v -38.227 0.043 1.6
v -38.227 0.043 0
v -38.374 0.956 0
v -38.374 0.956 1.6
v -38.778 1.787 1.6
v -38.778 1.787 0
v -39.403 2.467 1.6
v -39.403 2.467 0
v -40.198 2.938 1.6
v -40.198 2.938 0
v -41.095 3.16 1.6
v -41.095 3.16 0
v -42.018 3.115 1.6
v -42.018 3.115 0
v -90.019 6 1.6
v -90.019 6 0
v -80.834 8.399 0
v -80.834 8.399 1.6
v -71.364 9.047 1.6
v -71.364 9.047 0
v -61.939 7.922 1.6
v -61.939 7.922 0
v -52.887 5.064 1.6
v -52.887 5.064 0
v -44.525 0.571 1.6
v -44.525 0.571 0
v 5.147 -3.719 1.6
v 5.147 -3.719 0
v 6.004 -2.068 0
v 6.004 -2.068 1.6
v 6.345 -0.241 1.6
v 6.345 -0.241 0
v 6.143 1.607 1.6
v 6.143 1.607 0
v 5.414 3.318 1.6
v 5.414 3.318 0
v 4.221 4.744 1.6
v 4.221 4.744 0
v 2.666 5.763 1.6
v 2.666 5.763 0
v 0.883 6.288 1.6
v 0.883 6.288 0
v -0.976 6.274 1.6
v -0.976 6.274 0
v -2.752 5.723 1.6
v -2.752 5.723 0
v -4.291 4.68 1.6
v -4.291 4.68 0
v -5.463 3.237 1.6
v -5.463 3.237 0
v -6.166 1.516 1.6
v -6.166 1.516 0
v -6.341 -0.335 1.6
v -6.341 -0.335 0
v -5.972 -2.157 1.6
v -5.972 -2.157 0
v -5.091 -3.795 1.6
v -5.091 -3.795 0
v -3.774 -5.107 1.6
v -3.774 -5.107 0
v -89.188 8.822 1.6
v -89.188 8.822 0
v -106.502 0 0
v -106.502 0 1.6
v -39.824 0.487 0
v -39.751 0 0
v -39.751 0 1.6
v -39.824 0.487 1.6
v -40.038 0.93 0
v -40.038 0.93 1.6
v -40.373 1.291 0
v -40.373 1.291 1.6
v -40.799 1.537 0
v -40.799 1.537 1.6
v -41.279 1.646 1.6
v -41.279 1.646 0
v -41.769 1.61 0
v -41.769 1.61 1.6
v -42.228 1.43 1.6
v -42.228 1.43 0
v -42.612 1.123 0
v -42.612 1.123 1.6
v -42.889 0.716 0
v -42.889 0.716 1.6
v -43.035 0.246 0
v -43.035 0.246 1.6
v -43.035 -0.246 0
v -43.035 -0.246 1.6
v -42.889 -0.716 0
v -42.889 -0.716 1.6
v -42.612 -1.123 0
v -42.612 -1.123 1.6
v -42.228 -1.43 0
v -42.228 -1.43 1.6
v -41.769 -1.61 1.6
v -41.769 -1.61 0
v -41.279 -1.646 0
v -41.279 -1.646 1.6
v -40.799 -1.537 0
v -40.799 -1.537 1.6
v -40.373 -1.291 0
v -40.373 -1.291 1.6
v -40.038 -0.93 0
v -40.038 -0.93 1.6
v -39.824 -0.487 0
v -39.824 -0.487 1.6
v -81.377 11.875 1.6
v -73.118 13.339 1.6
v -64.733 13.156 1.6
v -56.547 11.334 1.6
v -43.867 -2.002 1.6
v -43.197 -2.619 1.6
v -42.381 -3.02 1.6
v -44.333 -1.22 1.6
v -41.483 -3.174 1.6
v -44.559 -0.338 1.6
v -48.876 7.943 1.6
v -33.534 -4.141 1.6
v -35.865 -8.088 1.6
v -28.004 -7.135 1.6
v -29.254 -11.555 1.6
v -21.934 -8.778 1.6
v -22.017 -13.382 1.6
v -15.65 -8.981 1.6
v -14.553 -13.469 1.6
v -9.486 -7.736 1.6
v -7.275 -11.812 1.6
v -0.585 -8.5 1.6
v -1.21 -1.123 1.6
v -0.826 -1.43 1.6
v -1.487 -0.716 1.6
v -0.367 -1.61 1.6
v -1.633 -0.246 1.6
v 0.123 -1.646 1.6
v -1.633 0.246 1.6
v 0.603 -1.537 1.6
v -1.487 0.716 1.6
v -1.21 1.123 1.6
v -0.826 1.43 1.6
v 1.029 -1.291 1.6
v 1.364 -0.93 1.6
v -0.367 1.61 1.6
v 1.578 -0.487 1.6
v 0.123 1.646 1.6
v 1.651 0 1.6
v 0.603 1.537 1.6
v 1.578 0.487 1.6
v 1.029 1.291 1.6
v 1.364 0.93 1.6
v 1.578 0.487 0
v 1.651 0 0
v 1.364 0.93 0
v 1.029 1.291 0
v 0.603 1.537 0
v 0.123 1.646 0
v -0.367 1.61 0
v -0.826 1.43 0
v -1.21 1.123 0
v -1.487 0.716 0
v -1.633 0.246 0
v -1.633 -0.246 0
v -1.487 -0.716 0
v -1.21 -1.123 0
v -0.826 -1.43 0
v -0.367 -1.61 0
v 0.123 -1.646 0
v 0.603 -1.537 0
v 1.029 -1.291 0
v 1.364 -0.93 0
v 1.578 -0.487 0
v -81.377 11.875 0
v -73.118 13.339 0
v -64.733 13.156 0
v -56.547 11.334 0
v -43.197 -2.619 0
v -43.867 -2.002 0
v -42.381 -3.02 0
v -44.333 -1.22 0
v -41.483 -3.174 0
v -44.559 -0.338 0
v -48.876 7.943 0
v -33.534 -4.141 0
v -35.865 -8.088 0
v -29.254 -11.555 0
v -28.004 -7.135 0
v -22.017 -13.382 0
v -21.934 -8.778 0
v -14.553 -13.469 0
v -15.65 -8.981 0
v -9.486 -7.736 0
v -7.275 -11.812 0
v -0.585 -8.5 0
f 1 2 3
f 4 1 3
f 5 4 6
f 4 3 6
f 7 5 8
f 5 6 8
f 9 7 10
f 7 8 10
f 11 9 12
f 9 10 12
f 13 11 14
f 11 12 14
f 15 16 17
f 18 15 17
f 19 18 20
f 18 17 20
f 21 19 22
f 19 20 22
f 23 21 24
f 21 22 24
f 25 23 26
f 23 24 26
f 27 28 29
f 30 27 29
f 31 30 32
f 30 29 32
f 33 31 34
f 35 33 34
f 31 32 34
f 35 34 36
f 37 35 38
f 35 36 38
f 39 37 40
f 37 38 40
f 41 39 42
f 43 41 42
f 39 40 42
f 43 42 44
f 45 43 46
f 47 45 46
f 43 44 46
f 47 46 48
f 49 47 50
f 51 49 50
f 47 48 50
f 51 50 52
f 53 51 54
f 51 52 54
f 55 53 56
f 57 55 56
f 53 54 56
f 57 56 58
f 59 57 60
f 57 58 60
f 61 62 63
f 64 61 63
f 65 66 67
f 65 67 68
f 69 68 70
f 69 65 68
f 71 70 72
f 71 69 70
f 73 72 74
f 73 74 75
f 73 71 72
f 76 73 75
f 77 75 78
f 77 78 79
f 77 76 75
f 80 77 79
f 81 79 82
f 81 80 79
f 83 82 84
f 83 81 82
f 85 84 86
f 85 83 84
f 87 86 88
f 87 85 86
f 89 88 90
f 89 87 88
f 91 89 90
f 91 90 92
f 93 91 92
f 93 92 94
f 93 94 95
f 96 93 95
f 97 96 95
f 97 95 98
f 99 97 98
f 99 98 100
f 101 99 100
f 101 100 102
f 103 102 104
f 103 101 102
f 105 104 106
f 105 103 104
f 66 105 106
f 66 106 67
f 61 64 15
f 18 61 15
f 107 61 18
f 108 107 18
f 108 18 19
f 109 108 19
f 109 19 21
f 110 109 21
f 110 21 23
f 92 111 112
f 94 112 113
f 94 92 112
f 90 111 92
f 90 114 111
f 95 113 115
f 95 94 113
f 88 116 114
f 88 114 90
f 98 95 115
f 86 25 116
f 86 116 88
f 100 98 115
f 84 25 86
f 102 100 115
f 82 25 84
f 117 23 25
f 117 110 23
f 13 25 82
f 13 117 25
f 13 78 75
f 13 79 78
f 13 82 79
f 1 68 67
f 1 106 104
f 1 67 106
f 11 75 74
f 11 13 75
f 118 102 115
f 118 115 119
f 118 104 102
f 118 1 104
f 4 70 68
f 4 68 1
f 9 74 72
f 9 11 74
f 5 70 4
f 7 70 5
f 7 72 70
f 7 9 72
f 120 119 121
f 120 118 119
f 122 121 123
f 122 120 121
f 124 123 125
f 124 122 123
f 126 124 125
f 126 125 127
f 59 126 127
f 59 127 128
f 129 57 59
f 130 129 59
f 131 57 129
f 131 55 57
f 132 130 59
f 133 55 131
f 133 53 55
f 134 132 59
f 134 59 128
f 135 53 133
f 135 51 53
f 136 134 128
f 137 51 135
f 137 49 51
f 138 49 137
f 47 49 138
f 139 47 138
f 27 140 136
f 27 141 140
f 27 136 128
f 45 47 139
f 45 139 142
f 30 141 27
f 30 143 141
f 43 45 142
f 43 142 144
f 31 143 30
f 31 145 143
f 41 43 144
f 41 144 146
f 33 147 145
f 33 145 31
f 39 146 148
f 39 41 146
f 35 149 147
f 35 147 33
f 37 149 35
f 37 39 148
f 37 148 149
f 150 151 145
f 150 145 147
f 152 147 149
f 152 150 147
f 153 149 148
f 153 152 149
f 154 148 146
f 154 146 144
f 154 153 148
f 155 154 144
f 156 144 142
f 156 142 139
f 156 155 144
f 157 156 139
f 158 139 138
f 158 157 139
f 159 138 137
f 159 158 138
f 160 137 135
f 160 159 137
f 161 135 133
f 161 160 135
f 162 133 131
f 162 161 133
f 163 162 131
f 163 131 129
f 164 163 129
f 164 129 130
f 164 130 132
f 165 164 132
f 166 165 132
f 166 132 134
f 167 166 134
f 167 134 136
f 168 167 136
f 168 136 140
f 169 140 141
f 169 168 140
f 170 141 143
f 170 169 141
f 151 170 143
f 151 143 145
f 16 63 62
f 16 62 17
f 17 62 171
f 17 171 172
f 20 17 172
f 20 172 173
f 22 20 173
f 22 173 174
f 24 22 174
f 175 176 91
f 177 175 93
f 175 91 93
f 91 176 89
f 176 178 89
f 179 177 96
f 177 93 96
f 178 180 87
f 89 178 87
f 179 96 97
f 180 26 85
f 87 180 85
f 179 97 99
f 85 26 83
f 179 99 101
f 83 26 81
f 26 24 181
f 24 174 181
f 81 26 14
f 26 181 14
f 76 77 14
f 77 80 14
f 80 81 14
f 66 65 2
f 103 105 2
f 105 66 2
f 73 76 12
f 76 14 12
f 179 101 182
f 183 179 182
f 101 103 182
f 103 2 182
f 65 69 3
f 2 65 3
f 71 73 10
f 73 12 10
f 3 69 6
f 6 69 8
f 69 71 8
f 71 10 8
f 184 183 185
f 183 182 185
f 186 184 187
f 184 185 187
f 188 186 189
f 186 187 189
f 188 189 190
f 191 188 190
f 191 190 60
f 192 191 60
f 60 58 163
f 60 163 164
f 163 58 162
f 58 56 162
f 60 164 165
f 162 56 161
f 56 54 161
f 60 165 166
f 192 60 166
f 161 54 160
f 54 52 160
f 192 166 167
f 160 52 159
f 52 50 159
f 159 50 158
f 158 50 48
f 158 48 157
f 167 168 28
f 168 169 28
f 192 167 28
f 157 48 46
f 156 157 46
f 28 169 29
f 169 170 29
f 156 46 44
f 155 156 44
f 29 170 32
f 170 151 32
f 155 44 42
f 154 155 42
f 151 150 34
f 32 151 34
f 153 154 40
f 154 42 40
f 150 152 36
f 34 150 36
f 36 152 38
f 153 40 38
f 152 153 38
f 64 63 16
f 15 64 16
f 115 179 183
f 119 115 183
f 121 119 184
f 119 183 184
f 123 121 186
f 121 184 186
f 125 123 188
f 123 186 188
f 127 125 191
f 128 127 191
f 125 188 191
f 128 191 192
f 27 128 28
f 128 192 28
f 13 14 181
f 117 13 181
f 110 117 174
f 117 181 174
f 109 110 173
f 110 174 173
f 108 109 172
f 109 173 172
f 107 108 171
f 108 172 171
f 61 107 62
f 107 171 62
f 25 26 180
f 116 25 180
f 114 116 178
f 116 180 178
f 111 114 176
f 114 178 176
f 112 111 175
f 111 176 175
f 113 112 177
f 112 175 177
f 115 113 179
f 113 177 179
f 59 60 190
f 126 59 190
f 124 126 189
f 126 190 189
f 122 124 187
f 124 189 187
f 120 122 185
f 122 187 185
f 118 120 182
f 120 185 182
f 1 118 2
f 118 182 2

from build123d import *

# Parameters (mm, degrees)
F0_R     = 1.651
F1_DEPTH = 1.6002


with BuildPart() as f1:
    # F0 (on Top) → F1 (new body)
    with BuildSketch(Plane.XY):
        with BuildLine():
            ThreePointArc((-3.774051, -5.106764), (-21.934308, -8.777509), (-38.227296, 0.043366))
            ThreePointArc((-38.227296, 0.043366), (-39.403324, 2.466965), (-42.018165, 3.114637))
            ThreePointArc((-42.018165, 3.114637), (-64.733422, 13.156228), (-89.188089, 8.82198))
            Line((-89.188089, 8.82198), (-106.5022, 0))
            Line((-106.5022, 0), (-90.018623, 5.999531))
            ThreePointArc((-90.018623, 5.999531), (-66.625194, 8.705331), (-44.525194, 0.571215))
            ThreePointArc((-44.525194, 0.571215), (-43.86651, -2.001703), (-41.483321, -3.173958))
            ThreePointArc((-41.483321, -3.173958), (-18.287164, -13.645991), (5.147266, -3.718622))
            ThreePointArc((5.147266, -3.718622), (-0.976301, 6.274499), (-3.774051, -5.106764))
        make_face()
        with Locations((-41.402, 0)):
            Circle(F0_R, mode=Mode.SUBTRACT)
        Circle(F0_R, mode=Mode.SUBTRACT)
    extrude(amount=F1_DEPTH)


solid = f1.part
